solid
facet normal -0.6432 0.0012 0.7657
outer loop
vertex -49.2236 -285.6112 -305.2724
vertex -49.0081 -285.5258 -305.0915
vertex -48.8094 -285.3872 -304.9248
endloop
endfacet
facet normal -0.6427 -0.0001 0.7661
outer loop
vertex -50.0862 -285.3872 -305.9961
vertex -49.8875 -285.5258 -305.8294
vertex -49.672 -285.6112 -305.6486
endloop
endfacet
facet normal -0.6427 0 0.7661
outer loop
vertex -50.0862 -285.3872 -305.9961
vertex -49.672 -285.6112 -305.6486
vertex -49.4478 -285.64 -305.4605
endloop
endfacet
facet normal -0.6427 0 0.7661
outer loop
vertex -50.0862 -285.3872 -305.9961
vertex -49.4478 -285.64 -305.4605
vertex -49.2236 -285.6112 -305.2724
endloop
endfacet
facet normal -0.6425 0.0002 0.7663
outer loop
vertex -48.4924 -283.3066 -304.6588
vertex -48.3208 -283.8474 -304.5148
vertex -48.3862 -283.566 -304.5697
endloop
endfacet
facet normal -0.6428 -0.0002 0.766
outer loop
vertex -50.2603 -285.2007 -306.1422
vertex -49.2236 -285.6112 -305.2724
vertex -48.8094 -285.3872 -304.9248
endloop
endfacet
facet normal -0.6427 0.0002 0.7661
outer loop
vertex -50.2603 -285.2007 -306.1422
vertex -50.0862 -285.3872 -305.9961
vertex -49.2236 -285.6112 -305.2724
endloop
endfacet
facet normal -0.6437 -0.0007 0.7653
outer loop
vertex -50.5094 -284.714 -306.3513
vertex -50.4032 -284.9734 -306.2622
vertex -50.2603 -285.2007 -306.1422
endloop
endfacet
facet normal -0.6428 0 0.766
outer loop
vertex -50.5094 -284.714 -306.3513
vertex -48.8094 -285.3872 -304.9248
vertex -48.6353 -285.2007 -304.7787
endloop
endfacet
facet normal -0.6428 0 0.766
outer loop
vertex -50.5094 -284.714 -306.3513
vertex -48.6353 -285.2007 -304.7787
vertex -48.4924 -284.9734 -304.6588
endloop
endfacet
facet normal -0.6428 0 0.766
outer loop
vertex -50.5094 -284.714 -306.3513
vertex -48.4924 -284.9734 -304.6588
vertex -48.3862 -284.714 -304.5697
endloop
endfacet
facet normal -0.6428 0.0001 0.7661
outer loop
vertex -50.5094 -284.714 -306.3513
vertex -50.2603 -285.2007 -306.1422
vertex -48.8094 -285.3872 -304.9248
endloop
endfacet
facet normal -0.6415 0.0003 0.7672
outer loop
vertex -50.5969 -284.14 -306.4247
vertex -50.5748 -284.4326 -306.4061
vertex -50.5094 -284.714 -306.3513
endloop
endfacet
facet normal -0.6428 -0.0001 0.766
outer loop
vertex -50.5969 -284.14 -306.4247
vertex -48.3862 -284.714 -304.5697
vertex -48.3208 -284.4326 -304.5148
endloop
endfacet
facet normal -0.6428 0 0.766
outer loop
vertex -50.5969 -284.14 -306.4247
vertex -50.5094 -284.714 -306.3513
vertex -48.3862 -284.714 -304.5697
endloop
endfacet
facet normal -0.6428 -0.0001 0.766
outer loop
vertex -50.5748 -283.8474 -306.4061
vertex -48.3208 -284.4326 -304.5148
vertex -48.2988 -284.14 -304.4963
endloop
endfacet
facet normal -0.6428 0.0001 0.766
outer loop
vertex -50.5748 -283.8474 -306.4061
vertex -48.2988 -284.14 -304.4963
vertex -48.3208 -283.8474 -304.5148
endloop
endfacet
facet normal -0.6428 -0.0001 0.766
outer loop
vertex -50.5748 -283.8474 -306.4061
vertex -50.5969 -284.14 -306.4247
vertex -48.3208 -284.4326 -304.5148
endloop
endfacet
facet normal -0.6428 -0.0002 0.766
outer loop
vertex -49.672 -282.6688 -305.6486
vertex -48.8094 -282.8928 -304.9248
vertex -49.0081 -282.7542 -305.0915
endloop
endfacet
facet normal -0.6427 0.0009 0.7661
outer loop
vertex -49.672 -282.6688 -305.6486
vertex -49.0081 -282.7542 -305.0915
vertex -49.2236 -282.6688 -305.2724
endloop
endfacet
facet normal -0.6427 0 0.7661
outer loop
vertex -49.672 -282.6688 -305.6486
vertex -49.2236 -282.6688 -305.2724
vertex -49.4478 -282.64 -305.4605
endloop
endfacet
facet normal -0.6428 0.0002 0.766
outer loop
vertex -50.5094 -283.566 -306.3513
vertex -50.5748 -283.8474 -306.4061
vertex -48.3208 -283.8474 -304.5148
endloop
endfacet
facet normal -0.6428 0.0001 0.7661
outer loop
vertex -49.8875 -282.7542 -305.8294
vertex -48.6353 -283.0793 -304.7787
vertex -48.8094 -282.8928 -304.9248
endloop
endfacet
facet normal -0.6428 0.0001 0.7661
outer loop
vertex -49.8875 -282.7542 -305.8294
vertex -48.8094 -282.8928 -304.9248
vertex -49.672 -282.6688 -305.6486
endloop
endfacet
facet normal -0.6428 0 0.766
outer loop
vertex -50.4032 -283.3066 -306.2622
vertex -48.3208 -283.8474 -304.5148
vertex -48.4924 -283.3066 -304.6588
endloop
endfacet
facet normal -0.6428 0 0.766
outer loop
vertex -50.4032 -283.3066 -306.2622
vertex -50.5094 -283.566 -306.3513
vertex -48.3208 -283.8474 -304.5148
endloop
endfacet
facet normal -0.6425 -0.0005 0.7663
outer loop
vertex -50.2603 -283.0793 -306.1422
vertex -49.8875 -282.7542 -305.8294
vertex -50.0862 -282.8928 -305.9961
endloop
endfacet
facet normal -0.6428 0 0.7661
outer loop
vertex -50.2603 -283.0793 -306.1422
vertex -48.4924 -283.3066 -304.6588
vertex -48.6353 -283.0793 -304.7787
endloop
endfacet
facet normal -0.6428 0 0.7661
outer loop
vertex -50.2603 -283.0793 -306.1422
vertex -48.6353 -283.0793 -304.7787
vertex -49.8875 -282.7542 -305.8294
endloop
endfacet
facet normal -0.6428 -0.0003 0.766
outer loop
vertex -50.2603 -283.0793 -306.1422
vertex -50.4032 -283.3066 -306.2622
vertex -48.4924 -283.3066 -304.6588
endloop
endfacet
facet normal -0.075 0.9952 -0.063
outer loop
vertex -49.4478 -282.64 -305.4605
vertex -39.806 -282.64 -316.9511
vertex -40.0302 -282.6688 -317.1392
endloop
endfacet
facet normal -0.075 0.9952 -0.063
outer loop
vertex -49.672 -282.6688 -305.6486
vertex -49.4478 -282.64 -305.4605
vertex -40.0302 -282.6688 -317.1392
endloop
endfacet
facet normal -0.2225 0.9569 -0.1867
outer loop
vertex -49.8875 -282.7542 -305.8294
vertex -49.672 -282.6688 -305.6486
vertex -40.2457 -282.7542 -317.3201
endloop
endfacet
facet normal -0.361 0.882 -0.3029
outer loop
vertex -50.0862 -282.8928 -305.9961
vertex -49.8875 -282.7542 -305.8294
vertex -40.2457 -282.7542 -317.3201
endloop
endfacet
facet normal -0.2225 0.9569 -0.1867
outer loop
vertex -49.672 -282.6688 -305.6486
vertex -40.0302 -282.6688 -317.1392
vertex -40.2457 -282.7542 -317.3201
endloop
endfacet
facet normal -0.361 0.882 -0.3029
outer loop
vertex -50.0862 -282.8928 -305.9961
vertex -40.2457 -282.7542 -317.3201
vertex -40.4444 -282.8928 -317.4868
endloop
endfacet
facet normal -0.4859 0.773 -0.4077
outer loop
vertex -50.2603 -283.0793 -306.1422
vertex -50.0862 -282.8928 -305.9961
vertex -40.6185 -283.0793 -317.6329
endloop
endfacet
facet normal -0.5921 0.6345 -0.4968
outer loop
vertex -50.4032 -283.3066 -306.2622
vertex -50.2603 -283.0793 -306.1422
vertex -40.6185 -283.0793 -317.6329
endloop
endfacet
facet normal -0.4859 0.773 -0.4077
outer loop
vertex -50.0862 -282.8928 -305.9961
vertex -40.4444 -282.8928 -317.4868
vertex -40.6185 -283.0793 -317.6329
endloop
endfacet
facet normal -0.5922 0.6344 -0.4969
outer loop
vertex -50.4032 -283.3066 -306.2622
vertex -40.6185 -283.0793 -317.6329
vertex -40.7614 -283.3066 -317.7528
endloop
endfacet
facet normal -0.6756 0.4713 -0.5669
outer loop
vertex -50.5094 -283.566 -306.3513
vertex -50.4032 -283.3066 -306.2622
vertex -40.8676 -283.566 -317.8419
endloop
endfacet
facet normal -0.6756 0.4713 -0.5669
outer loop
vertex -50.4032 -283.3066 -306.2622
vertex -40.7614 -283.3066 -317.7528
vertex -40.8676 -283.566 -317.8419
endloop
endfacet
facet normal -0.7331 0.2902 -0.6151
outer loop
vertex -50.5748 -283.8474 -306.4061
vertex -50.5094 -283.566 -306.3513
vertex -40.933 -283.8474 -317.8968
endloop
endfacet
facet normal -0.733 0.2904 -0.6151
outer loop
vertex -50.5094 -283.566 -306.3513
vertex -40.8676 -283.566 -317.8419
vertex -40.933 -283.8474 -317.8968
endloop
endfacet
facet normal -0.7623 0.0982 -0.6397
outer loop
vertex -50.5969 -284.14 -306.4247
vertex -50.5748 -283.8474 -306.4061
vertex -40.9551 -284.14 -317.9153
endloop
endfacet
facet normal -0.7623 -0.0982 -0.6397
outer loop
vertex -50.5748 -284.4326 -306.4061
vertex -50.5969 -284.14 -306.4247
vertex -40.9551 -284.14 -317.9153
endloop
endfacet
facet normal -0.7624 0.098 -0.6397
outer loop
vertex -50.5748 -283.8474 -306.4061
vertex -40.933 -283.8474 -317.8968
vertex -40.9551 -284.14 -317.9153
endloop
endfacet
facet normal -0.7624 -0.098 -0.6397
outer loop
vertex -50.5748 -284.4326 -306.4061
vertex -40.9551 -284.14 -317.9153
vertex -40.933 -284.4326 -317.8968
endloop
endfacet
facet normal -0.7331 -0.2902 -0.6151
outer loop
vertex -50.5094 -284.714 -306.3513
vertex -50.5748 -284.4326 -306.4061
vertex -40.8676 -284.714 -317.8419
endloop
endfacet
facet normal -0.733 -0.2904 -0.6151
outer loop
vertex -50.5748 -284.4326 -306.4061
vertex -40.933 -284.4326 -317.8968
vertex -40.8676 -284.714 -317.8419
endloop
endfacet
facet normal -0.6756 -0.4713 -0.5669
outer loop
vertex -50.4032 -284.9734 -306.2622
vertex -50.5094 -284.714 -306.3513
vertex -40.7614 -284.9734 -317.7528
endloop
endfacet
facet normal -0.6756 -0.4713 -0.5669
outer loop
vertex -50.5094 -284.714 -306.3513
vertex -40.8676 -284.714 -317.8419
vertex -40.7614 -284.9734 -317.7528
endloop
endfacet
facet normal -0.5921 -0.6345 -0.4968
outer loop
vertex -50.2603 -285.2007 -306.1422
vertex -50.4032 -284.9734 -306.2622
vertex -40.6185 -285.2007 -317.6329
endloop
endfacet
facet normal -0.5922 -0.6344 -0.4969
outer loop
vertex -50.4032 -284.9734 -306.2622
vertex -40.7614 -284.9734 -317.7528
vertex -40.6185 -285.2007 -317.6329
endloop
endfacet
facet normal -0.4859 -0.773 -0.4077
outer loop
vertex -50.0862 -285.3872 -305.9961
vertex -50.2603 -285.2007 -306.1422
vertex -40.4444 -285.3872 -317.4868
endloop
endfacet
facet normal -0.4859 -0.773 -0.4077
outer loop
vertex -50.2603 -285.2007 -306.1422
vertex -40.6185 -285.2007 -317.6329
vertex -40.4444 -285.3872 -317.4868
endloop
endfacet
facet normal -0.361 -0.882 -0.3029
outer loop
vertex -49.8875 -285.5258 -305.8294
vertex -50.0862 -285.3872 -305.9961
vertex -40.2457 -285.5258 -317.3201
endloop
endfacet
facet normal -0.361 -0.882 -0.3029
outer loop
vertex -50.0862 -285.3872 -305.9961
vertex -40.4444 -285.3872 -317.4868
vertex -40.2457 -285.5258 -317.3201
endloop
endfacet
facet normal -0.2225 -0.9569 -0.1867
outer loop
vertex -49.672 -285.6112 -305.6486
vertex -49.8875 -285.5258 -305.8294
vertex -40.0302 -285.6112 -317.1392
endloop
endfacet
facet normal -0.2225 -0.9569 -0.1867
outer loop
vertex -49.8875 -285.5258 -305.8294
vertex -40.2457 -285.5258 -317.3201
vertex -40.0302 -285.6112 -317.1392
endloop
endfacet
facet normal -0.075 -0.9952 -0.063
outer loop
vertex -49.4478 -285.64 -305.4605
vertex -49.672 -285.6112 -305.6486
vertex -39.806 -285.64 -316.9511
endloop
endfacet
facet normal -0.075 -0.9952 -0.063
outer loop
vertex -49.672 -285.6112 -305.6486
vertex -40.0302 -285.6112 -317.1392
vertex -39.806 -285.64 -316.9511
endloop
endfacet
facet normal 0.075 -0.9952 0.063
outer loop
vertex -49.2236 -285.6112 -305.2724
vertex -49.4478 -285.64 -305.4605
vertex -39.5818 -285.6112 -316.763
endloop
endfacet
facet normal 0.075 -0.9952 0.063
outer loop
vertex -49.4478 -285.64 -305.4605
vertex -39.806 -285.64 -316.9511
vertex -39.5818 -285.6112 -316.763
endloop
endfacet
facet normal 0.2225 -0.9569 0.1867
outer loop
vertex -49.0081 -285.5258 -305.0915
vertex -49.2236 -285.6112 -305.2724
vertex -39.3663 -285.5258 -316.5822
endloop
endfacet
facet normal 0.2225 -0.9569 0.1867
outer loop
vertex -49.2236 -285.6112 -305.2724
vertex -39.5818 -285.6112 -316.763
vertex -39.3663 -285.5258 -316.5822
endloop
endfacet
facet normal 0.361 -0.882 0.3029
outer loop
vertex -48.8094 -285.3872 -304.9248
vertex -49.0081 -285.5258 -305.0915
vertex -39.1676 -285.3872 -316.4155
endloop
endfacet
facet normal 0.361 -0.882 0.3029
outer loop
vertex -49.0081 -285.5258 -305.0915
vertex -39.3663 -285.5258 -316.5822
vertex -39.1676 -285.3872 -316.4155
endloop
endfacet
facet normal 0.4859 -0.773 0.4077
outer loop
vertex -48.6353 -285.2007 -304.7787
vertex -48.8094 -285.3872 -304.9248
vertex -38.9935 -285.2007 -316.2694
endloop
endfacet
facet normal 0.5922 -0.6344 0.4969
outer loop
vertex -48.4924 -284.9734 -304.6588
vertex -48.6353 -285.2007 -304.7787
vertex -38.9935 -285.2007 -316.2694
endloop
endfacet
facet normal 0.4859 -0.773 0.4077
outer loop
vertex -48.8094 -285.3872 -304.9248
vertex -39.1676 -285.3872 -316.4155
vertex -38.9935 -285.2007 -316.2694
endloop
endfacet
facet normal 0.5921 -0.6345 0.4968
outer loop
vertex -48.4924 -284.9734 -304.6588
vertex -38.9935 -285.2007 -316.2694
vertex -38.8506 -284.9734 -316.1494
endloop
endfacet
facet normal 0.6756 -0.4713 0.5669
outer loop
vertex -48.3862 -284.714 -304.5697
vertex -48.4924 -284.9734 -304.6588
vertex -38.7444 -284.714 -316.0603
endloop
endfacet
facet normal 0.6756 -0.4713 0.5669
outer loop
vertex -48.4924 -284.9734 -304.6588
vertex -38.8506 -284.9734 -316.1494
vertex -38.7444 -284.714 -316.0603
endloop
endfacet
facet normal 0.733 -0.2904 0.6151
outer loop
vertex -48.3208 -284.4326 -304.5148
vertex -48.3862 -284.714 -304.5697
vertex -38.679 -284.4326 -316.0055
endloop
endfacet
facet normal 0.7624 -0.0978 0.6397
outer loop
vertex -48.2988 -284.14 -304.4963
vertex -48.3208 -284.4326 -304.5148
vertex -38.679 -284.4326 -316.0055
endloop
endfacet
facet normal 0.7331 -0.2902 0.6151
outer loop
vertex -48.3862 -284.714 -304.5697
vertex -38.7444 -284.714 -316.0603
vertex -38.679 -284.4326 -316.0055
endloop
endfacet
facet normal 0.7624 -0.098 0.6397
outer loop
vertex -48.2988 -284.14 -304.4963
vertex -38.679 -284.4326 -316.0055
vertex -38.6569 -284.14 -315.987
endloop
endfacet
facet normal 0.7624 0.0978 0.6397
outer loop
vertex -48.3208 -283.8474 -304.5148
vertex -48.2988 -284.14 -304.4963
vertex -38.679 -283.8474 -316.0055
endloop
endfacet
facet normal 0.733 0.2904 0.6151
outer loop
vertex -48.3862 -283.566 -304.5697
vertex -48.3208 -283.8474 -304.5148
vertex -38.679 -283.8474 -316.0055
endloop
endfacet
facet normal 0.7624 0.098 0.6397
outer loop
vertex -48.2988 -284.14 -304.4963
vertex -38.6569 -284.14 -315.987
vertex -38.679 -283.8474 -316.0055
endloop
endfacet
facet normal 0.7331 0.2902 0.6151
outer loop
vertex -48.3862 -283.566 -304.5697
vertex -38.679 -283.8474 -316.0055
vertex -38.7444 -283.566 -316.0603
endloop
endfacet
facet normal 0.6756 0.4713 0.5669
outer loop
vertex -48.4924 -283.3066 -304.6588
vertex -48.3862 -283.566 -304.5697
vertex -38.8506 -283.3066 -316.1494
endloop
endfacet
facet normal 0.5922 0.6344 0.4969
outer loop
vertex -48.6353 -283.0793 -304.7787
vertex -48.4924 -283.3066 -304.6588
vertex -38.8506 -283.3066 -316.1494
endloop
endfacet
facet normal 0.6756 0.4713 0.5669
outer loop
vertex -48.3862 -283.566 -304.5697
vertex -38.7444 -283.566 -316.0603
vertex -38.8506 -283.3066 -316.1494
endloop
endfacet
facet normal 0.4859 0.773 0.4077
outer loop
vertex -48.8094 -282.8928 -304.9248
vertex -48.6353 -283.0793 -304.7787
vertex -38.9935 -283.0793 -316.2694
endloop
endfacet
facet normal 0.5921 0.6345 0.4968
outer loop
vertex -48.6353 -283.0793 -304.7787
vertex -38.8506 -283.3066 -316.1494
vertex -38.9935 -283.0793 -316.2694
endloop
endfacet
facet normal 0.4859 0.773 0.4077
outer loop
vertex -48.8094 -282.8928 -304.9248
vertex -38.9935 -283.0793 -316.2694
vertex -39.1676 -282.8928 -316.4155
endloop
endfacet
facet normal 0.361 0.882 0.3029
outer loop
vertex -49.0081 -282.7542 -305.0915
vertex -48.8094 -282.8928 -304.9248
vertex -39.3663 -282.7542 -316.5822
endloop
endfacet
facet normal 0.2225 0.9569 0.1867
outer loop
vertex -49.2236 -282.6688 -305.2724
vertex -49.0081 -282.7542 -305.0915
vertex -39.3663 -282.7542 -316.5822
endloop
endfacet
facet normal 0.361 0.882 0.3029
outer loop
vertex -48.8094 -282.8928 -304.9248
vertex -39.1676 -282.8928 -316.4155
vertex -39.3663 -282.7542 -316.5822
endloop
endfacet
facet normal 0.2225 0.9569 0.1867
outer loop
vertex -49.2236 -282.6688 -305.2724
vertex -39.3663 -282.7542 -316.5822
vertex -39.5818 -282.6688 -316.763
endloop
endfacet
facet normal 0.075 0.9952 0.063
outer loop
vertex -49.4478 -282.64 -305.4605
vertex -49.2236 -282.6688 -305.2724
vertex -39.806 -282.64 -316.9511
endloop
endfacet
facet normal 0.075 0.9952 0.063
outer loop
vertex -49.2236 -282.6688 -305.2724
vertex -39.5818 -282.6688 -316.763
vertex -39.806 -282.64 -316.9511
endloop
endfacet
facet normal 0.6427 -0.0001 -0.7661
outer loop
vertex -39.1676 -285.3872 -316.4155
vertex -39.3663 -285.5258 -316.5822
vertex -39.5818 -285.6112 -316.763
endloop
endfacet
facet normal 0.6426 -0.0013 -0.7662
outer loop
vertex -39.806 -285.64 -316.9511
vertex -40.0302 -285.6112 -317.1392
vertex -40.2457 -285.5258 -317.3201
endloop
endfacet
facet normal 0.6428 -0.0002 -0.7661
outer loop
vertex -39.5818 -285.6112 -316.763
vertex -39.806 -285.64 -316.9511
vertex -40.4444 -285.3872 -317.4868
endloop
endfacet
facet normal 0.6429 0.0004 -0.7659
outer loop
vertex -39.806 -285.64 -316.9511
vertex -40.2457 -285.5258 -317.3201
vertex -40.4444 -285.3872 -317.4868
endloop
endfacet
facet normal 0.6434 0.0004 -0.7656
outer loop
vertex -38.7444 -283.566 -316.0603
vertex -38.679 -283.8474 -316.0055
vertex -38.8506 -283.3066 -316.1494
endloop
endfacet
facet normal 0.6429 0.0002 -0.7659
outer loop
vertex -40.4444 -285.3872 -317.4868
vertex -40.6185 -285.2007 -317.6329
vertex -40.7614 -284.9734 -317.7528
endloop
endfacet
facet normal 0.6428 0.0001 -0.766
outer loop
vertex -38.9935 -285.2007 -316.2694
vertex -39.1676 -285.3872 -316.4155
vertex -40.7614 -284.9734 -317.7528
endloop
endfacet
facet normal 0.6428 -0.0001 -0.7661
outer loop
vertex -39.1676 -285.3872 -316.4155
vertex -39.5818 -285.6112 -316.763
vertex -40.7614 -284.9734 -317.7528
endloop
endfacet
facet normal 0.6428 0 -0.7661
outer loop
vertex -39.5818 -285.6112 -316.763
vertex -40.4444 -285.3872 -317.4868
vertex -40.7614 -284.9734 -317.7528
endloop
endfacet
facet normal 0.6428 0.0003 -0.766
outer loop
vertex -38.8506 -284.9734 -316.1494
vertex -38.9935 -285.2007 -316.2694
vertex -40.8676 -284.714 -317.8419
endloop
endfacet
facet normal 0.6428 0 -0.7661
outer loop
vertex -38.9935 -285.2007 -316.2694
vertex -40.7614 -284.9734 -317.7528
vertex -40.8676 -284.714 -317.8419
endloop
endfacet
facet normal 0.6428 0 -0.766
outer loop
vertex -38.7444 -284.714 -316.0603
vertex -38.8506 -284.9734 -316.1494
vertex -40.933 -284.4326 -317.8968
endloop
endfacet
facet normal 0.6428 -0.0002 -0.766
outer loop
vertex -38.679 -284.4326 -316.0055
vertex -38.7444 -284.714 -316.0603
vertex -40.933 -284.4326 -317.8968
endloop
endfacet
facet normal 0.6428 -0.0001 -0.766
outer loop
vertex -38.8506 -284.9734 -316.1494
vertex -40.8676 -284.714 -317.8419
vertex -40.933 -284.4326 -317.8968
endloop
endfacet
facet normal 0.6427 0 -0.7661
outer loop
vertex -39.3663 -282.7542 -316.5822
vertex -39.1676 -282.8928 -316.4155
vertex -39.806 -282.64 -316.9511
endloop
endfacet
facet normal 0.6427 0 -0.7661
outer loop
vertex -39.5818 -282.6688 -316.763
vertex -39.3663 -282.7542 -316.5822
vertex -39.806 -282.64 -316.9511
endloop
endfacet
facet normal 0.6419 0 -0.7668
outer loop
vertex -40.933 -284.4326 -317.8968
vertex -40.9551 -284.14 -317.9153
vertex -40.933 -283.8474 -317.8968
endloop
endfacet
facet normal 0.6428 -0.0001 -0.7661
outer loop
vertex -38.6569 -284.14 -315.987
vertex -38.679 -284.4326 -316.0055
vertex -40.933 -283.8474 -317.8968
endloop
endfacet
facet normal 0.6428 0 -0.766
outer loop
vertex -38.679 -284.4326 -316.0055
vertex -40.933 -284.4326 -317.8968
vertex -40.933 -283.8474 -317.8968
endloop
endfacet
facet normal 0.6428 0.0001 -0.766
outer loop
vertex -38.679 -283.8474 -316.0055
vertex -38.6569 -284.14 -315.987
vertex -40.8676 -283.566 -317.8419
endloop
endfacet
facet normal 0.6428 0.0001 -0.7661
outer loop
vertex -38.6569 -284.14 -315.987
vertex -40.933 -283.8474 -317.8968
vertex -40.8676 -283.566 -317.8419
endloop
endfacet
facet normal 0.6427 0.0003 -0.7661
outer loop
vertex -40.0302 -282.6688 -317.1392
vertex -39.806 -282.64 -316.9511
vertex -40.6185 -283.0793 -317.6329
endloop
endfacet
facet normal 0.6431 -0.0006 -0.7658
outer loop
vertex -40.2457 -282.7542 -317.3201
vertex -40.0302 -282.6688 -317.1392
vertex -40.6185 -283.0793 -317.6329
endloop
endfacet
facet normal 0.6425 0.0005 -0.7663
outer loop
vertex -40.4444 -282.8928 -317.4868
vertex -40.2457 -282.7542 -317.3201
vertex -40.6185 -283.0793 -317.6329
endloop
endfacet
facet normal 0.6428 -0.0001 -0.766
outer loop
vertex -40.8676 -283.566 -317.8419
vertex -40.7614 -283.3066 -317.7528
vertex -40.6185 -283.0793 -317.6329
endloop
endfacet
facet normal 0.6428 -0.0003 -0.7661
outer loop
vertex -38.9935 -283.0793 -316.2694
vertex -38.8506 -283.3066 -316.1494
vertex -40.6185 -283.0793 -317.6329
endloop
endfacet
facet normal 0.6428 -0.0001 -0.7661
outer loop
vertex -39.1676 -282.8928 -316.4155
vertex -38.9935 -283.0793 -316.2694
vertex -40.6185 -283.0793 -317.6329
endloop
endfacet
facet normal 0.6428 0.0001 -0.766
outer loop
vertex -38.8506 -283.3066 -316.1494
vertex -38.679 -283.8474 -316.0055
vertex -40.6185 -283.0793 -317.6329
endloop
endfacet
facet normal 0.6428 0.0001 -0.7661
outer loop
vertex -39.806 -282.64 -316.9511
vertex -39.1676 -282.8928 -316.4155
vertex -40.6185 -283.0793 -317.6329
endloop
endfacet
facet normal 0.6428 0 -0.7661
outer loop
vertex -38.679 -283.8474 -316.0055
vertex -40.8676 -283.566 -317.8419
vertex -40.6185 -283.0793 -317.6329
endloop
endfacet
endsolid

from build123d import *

# Parameters (mm, degrees)
CYLINDER154_R                     = 1.5
CYLINDER154_DEPTH                 = 15
CYLINDER154_PLACEMENT_ANGLE       = 40
PART_MIRRORING002_PLACEMENT_ANGLE = 90


with BuildPart() as cylinder154:
    # Cylinder154 → Cylinder154 (new body)
    with BuildSketch(Plane.XY):
        Circle(CYLINDER154_R)
    extrude(amount=CYLINDER154_DEPTH)


with BuildPart() as cylinder154_1:
    # Cylinder154 placement: moved
    add(cylinder154.part.moved(Location((0, -251.493993, -317.931136))).rotate(Axis((0, -251.493993, -317.931136), (-1, 0, 0)), CYLINDER154_PLACEMENT_ANGLE))


with BuildPart() as part_mirroring002:
    # Part__Mirroring002: instance of Cylinder154
    add(cylinder154_1.part.mirror(Plane(origin=(0, 0, 0), x_dir=(1, 0, 0), z_dir=(0, 1, 0))))


with BuildPart() as part_mirroring002_1:
    # Part__Mirroring002 placement: moved
    add(part_mirroring002.part.moved(Location((291.3, -284.14, 0.98))).rotate(Axis((291.3, -284.14, 0.98), (0, 0, 1)), PART_MIRRORING002_PLACEMENT_ANGLE))


with BuildPart() as part_mirroring003:
    # Part__Mirroring003: instance of Part__Mirroring002
    add(part_mirroring002_1.part.mirror(Plane(origin=(0, 0, 0), x_dir=(0, -1, 0), z_dir=(1, 0, 0))))


solid = part_mirroring003.part
